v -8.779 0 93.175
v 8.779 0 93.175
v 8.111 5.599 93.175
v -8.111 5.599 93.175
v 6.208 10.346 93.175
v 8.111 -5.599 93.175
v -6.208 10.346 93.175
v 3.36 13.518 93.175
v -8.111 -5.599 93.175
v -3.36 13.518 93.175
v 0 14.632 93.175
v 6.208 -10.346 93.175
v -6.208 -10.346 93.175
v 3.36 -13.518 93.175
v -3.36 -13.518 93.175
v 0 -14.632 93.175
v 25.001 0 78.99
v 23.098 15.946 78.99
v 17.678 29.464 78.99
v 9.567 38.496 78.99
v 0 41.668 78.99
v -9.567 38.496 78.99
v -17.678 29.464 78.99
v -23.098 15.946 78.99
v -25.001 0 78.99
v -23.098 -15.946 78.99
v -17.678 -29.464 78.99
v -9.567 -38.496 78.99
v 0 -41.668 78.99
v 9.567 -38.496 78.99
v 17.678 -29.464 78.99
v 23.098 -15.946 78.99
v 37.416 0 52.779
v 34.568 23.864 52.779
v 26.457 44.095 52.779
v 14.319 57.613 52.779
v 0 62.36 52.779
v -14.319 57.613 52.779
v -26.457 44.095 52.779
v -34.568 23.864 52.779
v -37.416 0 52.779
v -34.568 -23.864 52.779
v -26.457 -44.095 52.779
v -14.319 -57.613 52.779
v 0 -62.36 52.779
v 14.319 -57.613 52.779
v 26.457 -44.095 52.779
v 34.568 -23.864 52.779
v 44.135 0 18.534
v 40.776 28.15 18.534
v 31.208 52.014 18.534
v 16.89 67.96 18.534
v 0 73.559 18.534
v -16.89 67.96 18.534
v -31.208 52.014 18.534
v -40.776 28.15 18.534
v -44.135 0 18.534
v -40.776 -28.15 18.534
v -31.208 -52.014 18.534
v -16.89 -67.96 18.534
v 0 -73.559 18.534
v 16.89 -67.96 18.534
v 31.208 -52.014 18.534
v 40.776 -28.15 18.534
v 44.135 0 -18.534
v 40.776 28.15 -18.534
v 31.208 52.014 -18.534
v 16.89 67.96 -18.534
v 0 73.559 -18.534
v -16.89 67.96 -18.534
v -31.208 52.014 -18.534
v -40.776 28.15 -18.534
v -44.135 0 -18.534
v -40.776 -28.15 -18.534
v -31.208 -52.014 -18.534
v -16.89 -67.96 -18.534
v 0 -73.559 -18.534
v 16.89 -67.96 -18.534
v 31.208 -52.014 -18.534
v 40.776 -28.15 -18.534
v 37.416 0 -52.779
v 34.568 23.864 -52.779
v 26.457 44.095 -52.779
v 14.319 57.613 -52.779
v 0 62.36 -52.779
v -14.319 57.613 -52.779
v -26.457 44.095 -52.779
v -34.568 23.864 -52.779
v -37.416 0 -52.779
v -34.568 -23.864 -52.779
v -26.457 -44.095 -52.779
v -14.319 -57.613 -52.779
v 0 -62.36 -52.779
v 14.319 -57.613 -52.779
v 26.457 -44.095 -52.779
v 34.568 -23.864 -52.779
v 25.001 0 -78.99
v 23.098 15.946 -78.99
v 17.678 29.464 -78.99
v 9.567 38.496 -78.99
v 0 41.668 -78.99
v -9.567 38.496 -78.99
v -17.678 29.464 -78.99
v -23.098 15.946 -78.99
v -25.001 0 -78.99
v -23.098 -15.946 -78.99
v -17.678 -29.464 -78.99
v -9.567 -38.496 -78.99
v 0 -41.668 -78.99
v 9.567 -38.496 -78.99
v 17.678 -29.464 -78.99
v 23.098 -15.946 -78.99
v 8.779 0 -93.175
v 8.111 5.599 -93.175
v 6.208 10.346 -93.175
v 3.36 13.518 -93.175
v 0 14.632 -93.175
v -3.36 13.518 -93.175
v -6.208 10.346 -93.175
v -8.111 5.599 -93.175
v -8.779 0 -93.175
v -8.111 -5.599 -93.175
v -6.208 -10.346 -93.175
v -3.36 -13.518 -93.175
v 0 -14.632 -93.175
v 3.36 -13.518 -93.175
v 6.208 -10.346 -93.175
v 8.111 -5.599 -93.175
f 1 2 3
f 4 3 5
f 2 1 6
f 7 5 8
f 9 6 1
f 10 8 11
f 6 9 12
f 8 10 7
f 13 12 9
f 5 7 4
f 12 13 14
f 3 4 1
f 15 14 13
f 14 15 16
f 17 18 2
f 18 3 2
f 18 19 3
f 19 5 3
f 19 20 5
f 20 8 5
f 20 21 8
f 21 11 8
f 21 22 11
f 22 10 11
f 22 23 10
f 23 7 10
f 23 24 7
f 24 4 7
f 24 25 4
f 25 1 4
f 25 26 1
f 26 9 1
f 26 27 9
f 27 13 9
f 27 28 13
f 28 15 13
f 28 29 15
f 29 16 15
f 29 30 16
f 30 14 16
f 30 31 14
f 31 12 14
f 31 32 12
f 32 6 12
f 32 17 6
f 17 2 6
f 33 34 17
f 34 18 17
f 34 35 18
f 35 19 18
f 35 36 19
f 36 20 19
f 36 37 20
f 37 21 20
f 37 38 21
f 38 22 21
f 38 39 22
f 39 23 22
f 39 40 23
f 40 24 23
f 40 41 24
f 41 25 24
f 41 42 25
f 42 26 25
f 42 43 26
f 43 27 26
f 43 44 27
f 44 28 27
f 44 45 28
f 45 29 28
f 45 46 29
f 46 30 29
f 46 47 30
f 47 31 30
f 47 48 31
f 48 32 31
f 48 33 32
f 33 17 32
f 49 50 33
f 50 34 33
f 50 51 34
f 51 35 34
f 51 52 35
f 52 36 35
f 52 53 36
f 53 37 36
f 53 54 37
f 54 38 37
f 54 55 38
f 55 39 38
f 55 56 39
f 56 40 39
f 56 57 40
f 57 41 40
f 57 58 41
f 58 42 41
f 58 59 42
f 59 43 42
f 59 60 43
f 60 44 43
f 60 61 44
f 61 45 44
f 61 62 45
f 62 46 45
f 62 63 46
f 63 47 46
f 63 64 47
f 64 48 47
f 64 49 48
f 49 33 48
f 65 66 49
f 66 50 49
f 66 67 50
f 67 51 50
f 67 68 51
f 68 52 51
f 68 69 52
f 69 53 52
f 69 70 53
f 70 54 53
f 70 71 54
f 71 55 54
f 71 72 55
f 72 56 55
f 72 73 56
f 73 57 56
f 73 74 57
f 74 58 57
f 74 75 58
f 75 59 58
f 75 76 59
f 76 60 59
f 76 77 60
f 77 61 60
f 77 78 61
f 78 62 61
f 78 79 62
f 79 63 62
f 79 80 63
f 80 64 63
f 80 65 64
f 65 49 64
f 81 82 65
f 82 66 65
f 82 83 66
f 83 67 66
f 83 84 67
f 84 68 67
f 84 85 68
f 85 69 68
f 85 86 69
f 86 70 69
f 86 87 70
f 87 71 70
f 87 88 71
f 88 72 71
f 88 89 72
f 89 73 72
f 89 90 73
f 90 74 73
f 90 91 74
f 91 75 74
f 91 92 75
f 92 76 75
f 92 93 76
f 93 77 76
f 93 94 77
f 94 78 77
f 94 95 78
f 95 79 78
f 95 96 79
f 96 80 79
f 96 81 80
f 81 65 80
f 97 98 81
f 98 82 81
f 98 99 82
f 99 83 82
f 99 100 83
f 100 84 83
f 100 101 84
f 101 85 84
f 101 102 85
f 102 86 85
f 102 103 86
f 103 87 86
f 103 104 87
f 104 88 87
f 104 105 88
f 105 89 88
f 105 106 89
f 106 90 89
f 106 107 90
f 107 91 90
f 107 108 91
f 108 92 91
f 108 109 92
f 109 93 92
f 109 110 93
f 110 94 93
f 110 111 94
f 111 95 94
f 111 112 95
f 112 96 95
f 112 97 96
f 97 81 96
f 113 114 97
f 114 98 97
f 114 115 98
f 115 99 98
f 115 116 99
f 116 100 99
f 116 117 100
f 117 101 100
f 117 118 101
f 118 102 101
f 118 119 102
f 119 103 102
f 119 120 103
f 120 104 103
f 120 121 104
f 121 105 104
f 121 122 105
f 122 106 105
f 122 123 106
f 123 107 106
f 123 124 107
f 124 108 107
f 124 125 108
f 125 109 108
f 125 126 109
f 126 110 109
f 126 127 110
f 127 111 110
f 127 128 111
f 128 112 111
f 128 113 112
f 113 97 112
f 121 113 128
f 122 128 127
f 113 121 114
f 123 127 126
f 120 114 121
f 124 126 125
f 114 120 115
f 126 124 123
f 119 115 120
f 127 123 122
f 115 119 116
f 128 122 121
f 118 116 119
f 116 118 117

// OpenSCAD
// Generated by SolidPython 1.0.1 on 2020-07-29 00:46:49


scale(v = [9, 15, 19]) {
	sphere(r = 5);
}
/***********************************************
*********      SolidPython code:      **********
************************************************
 
# import packages: SolidPython
from solid import *
from solid.utils import *
from itertools import chain, combinations, permutations


class Resize:

    def __init__(self, scad_file):
        self.scad_file = scad_file
        #self.scad_file = import_scad(scad_file)
        # cone/cylinder param:
        self.r1 = 0
        self.r2 = 0
        self.h = 0
        # rectangular prism param:
        self.w = 0
        self.l = 0
        # ellipse param:
        self.r = 0

    # import OpenScad code (file name corresponds to shape)


    # classify shape + parameters
    def assign(self, param1, param2, param3):
        if self.scad_file == 'cone.scad':
            self.r1 = param1
            self.r2 = param2
            self.h = param3
        elif self.scad_file == 'cylinder.scad':
            self.r1 = param1
            self.r2 = param2
            self.h = param3
        elif self.scad_file == 'rectangularPrism.scad':
            self.h = param1
            self.l = param2
            self.w = param3
        else:
            self.r = param1
            self.h = param2

    # resize parameters
    def iterate(self):
        x = range(3, 20, 2)
        i = 1
        if self.scad_file == 'cone.scad':
            tempList = list(permutations(x, 2))
            for temp in tempList:
                param1 = temp[0]
                param2 = temp[1]
                filepath = 'produced_scad_files/' + 'cone' + str(param1) + '_' + str(param2) + '_' + '.scad'
                scad_render_to_file(cylinder(h=param1, r1=param2, r2=0), filepath)

        elif self.scad_file == 'cylinder.scad':
            tempList = list(permutations(x, 3))
            for temp in tempList:
                param1 = temp[0]
                param2 = temp[1]
                filepath = 'produced_scad_files/' + 'cylinder' + str(param1) + '_' + str(param2) + '_' + '.scad'
                scad_render_to_file(cylinder(h=param1, r1=param2, r2=param2), filepath)

        elif self.scad_file == 'rectangularPrism.scad':
            tempList = list(permutations(x, 3))
            for temp in tempList:
                param1 = temp[0]
                param2 = temp[1]
                param3 = temp[2]
                filepath = 'produced_scad_files/' + 'rectangularPrism' + str(param1) + '_' + str(param2) + '_' + str(
                    param3) + '.scad'
                scad_render_to_file(cube(size=(param1, param2, param3)), filepath)

        elif self.scad_file == 'ellipse.scad':
            tempList = list(permutations(x, 4))
            for temp in tempList:
                param1 = temp[0]
                param2 = temp[1]
                param3 = temp[2]
                param4 = temp[3]
                filepath = 'produced_scad_files/' + 'ellipse' + str(param1) + '_' + str(param2) + '_' + str(param3) + '_' + str(param4) + '.scad'
                scad_render_to_file(scale([param1, param2, param3])(sphere(r=param4)), filepath)

    def render_to_scadfile(self):
        scad_render_to_file(scad, 'example.scad') 
 
************************************************/
